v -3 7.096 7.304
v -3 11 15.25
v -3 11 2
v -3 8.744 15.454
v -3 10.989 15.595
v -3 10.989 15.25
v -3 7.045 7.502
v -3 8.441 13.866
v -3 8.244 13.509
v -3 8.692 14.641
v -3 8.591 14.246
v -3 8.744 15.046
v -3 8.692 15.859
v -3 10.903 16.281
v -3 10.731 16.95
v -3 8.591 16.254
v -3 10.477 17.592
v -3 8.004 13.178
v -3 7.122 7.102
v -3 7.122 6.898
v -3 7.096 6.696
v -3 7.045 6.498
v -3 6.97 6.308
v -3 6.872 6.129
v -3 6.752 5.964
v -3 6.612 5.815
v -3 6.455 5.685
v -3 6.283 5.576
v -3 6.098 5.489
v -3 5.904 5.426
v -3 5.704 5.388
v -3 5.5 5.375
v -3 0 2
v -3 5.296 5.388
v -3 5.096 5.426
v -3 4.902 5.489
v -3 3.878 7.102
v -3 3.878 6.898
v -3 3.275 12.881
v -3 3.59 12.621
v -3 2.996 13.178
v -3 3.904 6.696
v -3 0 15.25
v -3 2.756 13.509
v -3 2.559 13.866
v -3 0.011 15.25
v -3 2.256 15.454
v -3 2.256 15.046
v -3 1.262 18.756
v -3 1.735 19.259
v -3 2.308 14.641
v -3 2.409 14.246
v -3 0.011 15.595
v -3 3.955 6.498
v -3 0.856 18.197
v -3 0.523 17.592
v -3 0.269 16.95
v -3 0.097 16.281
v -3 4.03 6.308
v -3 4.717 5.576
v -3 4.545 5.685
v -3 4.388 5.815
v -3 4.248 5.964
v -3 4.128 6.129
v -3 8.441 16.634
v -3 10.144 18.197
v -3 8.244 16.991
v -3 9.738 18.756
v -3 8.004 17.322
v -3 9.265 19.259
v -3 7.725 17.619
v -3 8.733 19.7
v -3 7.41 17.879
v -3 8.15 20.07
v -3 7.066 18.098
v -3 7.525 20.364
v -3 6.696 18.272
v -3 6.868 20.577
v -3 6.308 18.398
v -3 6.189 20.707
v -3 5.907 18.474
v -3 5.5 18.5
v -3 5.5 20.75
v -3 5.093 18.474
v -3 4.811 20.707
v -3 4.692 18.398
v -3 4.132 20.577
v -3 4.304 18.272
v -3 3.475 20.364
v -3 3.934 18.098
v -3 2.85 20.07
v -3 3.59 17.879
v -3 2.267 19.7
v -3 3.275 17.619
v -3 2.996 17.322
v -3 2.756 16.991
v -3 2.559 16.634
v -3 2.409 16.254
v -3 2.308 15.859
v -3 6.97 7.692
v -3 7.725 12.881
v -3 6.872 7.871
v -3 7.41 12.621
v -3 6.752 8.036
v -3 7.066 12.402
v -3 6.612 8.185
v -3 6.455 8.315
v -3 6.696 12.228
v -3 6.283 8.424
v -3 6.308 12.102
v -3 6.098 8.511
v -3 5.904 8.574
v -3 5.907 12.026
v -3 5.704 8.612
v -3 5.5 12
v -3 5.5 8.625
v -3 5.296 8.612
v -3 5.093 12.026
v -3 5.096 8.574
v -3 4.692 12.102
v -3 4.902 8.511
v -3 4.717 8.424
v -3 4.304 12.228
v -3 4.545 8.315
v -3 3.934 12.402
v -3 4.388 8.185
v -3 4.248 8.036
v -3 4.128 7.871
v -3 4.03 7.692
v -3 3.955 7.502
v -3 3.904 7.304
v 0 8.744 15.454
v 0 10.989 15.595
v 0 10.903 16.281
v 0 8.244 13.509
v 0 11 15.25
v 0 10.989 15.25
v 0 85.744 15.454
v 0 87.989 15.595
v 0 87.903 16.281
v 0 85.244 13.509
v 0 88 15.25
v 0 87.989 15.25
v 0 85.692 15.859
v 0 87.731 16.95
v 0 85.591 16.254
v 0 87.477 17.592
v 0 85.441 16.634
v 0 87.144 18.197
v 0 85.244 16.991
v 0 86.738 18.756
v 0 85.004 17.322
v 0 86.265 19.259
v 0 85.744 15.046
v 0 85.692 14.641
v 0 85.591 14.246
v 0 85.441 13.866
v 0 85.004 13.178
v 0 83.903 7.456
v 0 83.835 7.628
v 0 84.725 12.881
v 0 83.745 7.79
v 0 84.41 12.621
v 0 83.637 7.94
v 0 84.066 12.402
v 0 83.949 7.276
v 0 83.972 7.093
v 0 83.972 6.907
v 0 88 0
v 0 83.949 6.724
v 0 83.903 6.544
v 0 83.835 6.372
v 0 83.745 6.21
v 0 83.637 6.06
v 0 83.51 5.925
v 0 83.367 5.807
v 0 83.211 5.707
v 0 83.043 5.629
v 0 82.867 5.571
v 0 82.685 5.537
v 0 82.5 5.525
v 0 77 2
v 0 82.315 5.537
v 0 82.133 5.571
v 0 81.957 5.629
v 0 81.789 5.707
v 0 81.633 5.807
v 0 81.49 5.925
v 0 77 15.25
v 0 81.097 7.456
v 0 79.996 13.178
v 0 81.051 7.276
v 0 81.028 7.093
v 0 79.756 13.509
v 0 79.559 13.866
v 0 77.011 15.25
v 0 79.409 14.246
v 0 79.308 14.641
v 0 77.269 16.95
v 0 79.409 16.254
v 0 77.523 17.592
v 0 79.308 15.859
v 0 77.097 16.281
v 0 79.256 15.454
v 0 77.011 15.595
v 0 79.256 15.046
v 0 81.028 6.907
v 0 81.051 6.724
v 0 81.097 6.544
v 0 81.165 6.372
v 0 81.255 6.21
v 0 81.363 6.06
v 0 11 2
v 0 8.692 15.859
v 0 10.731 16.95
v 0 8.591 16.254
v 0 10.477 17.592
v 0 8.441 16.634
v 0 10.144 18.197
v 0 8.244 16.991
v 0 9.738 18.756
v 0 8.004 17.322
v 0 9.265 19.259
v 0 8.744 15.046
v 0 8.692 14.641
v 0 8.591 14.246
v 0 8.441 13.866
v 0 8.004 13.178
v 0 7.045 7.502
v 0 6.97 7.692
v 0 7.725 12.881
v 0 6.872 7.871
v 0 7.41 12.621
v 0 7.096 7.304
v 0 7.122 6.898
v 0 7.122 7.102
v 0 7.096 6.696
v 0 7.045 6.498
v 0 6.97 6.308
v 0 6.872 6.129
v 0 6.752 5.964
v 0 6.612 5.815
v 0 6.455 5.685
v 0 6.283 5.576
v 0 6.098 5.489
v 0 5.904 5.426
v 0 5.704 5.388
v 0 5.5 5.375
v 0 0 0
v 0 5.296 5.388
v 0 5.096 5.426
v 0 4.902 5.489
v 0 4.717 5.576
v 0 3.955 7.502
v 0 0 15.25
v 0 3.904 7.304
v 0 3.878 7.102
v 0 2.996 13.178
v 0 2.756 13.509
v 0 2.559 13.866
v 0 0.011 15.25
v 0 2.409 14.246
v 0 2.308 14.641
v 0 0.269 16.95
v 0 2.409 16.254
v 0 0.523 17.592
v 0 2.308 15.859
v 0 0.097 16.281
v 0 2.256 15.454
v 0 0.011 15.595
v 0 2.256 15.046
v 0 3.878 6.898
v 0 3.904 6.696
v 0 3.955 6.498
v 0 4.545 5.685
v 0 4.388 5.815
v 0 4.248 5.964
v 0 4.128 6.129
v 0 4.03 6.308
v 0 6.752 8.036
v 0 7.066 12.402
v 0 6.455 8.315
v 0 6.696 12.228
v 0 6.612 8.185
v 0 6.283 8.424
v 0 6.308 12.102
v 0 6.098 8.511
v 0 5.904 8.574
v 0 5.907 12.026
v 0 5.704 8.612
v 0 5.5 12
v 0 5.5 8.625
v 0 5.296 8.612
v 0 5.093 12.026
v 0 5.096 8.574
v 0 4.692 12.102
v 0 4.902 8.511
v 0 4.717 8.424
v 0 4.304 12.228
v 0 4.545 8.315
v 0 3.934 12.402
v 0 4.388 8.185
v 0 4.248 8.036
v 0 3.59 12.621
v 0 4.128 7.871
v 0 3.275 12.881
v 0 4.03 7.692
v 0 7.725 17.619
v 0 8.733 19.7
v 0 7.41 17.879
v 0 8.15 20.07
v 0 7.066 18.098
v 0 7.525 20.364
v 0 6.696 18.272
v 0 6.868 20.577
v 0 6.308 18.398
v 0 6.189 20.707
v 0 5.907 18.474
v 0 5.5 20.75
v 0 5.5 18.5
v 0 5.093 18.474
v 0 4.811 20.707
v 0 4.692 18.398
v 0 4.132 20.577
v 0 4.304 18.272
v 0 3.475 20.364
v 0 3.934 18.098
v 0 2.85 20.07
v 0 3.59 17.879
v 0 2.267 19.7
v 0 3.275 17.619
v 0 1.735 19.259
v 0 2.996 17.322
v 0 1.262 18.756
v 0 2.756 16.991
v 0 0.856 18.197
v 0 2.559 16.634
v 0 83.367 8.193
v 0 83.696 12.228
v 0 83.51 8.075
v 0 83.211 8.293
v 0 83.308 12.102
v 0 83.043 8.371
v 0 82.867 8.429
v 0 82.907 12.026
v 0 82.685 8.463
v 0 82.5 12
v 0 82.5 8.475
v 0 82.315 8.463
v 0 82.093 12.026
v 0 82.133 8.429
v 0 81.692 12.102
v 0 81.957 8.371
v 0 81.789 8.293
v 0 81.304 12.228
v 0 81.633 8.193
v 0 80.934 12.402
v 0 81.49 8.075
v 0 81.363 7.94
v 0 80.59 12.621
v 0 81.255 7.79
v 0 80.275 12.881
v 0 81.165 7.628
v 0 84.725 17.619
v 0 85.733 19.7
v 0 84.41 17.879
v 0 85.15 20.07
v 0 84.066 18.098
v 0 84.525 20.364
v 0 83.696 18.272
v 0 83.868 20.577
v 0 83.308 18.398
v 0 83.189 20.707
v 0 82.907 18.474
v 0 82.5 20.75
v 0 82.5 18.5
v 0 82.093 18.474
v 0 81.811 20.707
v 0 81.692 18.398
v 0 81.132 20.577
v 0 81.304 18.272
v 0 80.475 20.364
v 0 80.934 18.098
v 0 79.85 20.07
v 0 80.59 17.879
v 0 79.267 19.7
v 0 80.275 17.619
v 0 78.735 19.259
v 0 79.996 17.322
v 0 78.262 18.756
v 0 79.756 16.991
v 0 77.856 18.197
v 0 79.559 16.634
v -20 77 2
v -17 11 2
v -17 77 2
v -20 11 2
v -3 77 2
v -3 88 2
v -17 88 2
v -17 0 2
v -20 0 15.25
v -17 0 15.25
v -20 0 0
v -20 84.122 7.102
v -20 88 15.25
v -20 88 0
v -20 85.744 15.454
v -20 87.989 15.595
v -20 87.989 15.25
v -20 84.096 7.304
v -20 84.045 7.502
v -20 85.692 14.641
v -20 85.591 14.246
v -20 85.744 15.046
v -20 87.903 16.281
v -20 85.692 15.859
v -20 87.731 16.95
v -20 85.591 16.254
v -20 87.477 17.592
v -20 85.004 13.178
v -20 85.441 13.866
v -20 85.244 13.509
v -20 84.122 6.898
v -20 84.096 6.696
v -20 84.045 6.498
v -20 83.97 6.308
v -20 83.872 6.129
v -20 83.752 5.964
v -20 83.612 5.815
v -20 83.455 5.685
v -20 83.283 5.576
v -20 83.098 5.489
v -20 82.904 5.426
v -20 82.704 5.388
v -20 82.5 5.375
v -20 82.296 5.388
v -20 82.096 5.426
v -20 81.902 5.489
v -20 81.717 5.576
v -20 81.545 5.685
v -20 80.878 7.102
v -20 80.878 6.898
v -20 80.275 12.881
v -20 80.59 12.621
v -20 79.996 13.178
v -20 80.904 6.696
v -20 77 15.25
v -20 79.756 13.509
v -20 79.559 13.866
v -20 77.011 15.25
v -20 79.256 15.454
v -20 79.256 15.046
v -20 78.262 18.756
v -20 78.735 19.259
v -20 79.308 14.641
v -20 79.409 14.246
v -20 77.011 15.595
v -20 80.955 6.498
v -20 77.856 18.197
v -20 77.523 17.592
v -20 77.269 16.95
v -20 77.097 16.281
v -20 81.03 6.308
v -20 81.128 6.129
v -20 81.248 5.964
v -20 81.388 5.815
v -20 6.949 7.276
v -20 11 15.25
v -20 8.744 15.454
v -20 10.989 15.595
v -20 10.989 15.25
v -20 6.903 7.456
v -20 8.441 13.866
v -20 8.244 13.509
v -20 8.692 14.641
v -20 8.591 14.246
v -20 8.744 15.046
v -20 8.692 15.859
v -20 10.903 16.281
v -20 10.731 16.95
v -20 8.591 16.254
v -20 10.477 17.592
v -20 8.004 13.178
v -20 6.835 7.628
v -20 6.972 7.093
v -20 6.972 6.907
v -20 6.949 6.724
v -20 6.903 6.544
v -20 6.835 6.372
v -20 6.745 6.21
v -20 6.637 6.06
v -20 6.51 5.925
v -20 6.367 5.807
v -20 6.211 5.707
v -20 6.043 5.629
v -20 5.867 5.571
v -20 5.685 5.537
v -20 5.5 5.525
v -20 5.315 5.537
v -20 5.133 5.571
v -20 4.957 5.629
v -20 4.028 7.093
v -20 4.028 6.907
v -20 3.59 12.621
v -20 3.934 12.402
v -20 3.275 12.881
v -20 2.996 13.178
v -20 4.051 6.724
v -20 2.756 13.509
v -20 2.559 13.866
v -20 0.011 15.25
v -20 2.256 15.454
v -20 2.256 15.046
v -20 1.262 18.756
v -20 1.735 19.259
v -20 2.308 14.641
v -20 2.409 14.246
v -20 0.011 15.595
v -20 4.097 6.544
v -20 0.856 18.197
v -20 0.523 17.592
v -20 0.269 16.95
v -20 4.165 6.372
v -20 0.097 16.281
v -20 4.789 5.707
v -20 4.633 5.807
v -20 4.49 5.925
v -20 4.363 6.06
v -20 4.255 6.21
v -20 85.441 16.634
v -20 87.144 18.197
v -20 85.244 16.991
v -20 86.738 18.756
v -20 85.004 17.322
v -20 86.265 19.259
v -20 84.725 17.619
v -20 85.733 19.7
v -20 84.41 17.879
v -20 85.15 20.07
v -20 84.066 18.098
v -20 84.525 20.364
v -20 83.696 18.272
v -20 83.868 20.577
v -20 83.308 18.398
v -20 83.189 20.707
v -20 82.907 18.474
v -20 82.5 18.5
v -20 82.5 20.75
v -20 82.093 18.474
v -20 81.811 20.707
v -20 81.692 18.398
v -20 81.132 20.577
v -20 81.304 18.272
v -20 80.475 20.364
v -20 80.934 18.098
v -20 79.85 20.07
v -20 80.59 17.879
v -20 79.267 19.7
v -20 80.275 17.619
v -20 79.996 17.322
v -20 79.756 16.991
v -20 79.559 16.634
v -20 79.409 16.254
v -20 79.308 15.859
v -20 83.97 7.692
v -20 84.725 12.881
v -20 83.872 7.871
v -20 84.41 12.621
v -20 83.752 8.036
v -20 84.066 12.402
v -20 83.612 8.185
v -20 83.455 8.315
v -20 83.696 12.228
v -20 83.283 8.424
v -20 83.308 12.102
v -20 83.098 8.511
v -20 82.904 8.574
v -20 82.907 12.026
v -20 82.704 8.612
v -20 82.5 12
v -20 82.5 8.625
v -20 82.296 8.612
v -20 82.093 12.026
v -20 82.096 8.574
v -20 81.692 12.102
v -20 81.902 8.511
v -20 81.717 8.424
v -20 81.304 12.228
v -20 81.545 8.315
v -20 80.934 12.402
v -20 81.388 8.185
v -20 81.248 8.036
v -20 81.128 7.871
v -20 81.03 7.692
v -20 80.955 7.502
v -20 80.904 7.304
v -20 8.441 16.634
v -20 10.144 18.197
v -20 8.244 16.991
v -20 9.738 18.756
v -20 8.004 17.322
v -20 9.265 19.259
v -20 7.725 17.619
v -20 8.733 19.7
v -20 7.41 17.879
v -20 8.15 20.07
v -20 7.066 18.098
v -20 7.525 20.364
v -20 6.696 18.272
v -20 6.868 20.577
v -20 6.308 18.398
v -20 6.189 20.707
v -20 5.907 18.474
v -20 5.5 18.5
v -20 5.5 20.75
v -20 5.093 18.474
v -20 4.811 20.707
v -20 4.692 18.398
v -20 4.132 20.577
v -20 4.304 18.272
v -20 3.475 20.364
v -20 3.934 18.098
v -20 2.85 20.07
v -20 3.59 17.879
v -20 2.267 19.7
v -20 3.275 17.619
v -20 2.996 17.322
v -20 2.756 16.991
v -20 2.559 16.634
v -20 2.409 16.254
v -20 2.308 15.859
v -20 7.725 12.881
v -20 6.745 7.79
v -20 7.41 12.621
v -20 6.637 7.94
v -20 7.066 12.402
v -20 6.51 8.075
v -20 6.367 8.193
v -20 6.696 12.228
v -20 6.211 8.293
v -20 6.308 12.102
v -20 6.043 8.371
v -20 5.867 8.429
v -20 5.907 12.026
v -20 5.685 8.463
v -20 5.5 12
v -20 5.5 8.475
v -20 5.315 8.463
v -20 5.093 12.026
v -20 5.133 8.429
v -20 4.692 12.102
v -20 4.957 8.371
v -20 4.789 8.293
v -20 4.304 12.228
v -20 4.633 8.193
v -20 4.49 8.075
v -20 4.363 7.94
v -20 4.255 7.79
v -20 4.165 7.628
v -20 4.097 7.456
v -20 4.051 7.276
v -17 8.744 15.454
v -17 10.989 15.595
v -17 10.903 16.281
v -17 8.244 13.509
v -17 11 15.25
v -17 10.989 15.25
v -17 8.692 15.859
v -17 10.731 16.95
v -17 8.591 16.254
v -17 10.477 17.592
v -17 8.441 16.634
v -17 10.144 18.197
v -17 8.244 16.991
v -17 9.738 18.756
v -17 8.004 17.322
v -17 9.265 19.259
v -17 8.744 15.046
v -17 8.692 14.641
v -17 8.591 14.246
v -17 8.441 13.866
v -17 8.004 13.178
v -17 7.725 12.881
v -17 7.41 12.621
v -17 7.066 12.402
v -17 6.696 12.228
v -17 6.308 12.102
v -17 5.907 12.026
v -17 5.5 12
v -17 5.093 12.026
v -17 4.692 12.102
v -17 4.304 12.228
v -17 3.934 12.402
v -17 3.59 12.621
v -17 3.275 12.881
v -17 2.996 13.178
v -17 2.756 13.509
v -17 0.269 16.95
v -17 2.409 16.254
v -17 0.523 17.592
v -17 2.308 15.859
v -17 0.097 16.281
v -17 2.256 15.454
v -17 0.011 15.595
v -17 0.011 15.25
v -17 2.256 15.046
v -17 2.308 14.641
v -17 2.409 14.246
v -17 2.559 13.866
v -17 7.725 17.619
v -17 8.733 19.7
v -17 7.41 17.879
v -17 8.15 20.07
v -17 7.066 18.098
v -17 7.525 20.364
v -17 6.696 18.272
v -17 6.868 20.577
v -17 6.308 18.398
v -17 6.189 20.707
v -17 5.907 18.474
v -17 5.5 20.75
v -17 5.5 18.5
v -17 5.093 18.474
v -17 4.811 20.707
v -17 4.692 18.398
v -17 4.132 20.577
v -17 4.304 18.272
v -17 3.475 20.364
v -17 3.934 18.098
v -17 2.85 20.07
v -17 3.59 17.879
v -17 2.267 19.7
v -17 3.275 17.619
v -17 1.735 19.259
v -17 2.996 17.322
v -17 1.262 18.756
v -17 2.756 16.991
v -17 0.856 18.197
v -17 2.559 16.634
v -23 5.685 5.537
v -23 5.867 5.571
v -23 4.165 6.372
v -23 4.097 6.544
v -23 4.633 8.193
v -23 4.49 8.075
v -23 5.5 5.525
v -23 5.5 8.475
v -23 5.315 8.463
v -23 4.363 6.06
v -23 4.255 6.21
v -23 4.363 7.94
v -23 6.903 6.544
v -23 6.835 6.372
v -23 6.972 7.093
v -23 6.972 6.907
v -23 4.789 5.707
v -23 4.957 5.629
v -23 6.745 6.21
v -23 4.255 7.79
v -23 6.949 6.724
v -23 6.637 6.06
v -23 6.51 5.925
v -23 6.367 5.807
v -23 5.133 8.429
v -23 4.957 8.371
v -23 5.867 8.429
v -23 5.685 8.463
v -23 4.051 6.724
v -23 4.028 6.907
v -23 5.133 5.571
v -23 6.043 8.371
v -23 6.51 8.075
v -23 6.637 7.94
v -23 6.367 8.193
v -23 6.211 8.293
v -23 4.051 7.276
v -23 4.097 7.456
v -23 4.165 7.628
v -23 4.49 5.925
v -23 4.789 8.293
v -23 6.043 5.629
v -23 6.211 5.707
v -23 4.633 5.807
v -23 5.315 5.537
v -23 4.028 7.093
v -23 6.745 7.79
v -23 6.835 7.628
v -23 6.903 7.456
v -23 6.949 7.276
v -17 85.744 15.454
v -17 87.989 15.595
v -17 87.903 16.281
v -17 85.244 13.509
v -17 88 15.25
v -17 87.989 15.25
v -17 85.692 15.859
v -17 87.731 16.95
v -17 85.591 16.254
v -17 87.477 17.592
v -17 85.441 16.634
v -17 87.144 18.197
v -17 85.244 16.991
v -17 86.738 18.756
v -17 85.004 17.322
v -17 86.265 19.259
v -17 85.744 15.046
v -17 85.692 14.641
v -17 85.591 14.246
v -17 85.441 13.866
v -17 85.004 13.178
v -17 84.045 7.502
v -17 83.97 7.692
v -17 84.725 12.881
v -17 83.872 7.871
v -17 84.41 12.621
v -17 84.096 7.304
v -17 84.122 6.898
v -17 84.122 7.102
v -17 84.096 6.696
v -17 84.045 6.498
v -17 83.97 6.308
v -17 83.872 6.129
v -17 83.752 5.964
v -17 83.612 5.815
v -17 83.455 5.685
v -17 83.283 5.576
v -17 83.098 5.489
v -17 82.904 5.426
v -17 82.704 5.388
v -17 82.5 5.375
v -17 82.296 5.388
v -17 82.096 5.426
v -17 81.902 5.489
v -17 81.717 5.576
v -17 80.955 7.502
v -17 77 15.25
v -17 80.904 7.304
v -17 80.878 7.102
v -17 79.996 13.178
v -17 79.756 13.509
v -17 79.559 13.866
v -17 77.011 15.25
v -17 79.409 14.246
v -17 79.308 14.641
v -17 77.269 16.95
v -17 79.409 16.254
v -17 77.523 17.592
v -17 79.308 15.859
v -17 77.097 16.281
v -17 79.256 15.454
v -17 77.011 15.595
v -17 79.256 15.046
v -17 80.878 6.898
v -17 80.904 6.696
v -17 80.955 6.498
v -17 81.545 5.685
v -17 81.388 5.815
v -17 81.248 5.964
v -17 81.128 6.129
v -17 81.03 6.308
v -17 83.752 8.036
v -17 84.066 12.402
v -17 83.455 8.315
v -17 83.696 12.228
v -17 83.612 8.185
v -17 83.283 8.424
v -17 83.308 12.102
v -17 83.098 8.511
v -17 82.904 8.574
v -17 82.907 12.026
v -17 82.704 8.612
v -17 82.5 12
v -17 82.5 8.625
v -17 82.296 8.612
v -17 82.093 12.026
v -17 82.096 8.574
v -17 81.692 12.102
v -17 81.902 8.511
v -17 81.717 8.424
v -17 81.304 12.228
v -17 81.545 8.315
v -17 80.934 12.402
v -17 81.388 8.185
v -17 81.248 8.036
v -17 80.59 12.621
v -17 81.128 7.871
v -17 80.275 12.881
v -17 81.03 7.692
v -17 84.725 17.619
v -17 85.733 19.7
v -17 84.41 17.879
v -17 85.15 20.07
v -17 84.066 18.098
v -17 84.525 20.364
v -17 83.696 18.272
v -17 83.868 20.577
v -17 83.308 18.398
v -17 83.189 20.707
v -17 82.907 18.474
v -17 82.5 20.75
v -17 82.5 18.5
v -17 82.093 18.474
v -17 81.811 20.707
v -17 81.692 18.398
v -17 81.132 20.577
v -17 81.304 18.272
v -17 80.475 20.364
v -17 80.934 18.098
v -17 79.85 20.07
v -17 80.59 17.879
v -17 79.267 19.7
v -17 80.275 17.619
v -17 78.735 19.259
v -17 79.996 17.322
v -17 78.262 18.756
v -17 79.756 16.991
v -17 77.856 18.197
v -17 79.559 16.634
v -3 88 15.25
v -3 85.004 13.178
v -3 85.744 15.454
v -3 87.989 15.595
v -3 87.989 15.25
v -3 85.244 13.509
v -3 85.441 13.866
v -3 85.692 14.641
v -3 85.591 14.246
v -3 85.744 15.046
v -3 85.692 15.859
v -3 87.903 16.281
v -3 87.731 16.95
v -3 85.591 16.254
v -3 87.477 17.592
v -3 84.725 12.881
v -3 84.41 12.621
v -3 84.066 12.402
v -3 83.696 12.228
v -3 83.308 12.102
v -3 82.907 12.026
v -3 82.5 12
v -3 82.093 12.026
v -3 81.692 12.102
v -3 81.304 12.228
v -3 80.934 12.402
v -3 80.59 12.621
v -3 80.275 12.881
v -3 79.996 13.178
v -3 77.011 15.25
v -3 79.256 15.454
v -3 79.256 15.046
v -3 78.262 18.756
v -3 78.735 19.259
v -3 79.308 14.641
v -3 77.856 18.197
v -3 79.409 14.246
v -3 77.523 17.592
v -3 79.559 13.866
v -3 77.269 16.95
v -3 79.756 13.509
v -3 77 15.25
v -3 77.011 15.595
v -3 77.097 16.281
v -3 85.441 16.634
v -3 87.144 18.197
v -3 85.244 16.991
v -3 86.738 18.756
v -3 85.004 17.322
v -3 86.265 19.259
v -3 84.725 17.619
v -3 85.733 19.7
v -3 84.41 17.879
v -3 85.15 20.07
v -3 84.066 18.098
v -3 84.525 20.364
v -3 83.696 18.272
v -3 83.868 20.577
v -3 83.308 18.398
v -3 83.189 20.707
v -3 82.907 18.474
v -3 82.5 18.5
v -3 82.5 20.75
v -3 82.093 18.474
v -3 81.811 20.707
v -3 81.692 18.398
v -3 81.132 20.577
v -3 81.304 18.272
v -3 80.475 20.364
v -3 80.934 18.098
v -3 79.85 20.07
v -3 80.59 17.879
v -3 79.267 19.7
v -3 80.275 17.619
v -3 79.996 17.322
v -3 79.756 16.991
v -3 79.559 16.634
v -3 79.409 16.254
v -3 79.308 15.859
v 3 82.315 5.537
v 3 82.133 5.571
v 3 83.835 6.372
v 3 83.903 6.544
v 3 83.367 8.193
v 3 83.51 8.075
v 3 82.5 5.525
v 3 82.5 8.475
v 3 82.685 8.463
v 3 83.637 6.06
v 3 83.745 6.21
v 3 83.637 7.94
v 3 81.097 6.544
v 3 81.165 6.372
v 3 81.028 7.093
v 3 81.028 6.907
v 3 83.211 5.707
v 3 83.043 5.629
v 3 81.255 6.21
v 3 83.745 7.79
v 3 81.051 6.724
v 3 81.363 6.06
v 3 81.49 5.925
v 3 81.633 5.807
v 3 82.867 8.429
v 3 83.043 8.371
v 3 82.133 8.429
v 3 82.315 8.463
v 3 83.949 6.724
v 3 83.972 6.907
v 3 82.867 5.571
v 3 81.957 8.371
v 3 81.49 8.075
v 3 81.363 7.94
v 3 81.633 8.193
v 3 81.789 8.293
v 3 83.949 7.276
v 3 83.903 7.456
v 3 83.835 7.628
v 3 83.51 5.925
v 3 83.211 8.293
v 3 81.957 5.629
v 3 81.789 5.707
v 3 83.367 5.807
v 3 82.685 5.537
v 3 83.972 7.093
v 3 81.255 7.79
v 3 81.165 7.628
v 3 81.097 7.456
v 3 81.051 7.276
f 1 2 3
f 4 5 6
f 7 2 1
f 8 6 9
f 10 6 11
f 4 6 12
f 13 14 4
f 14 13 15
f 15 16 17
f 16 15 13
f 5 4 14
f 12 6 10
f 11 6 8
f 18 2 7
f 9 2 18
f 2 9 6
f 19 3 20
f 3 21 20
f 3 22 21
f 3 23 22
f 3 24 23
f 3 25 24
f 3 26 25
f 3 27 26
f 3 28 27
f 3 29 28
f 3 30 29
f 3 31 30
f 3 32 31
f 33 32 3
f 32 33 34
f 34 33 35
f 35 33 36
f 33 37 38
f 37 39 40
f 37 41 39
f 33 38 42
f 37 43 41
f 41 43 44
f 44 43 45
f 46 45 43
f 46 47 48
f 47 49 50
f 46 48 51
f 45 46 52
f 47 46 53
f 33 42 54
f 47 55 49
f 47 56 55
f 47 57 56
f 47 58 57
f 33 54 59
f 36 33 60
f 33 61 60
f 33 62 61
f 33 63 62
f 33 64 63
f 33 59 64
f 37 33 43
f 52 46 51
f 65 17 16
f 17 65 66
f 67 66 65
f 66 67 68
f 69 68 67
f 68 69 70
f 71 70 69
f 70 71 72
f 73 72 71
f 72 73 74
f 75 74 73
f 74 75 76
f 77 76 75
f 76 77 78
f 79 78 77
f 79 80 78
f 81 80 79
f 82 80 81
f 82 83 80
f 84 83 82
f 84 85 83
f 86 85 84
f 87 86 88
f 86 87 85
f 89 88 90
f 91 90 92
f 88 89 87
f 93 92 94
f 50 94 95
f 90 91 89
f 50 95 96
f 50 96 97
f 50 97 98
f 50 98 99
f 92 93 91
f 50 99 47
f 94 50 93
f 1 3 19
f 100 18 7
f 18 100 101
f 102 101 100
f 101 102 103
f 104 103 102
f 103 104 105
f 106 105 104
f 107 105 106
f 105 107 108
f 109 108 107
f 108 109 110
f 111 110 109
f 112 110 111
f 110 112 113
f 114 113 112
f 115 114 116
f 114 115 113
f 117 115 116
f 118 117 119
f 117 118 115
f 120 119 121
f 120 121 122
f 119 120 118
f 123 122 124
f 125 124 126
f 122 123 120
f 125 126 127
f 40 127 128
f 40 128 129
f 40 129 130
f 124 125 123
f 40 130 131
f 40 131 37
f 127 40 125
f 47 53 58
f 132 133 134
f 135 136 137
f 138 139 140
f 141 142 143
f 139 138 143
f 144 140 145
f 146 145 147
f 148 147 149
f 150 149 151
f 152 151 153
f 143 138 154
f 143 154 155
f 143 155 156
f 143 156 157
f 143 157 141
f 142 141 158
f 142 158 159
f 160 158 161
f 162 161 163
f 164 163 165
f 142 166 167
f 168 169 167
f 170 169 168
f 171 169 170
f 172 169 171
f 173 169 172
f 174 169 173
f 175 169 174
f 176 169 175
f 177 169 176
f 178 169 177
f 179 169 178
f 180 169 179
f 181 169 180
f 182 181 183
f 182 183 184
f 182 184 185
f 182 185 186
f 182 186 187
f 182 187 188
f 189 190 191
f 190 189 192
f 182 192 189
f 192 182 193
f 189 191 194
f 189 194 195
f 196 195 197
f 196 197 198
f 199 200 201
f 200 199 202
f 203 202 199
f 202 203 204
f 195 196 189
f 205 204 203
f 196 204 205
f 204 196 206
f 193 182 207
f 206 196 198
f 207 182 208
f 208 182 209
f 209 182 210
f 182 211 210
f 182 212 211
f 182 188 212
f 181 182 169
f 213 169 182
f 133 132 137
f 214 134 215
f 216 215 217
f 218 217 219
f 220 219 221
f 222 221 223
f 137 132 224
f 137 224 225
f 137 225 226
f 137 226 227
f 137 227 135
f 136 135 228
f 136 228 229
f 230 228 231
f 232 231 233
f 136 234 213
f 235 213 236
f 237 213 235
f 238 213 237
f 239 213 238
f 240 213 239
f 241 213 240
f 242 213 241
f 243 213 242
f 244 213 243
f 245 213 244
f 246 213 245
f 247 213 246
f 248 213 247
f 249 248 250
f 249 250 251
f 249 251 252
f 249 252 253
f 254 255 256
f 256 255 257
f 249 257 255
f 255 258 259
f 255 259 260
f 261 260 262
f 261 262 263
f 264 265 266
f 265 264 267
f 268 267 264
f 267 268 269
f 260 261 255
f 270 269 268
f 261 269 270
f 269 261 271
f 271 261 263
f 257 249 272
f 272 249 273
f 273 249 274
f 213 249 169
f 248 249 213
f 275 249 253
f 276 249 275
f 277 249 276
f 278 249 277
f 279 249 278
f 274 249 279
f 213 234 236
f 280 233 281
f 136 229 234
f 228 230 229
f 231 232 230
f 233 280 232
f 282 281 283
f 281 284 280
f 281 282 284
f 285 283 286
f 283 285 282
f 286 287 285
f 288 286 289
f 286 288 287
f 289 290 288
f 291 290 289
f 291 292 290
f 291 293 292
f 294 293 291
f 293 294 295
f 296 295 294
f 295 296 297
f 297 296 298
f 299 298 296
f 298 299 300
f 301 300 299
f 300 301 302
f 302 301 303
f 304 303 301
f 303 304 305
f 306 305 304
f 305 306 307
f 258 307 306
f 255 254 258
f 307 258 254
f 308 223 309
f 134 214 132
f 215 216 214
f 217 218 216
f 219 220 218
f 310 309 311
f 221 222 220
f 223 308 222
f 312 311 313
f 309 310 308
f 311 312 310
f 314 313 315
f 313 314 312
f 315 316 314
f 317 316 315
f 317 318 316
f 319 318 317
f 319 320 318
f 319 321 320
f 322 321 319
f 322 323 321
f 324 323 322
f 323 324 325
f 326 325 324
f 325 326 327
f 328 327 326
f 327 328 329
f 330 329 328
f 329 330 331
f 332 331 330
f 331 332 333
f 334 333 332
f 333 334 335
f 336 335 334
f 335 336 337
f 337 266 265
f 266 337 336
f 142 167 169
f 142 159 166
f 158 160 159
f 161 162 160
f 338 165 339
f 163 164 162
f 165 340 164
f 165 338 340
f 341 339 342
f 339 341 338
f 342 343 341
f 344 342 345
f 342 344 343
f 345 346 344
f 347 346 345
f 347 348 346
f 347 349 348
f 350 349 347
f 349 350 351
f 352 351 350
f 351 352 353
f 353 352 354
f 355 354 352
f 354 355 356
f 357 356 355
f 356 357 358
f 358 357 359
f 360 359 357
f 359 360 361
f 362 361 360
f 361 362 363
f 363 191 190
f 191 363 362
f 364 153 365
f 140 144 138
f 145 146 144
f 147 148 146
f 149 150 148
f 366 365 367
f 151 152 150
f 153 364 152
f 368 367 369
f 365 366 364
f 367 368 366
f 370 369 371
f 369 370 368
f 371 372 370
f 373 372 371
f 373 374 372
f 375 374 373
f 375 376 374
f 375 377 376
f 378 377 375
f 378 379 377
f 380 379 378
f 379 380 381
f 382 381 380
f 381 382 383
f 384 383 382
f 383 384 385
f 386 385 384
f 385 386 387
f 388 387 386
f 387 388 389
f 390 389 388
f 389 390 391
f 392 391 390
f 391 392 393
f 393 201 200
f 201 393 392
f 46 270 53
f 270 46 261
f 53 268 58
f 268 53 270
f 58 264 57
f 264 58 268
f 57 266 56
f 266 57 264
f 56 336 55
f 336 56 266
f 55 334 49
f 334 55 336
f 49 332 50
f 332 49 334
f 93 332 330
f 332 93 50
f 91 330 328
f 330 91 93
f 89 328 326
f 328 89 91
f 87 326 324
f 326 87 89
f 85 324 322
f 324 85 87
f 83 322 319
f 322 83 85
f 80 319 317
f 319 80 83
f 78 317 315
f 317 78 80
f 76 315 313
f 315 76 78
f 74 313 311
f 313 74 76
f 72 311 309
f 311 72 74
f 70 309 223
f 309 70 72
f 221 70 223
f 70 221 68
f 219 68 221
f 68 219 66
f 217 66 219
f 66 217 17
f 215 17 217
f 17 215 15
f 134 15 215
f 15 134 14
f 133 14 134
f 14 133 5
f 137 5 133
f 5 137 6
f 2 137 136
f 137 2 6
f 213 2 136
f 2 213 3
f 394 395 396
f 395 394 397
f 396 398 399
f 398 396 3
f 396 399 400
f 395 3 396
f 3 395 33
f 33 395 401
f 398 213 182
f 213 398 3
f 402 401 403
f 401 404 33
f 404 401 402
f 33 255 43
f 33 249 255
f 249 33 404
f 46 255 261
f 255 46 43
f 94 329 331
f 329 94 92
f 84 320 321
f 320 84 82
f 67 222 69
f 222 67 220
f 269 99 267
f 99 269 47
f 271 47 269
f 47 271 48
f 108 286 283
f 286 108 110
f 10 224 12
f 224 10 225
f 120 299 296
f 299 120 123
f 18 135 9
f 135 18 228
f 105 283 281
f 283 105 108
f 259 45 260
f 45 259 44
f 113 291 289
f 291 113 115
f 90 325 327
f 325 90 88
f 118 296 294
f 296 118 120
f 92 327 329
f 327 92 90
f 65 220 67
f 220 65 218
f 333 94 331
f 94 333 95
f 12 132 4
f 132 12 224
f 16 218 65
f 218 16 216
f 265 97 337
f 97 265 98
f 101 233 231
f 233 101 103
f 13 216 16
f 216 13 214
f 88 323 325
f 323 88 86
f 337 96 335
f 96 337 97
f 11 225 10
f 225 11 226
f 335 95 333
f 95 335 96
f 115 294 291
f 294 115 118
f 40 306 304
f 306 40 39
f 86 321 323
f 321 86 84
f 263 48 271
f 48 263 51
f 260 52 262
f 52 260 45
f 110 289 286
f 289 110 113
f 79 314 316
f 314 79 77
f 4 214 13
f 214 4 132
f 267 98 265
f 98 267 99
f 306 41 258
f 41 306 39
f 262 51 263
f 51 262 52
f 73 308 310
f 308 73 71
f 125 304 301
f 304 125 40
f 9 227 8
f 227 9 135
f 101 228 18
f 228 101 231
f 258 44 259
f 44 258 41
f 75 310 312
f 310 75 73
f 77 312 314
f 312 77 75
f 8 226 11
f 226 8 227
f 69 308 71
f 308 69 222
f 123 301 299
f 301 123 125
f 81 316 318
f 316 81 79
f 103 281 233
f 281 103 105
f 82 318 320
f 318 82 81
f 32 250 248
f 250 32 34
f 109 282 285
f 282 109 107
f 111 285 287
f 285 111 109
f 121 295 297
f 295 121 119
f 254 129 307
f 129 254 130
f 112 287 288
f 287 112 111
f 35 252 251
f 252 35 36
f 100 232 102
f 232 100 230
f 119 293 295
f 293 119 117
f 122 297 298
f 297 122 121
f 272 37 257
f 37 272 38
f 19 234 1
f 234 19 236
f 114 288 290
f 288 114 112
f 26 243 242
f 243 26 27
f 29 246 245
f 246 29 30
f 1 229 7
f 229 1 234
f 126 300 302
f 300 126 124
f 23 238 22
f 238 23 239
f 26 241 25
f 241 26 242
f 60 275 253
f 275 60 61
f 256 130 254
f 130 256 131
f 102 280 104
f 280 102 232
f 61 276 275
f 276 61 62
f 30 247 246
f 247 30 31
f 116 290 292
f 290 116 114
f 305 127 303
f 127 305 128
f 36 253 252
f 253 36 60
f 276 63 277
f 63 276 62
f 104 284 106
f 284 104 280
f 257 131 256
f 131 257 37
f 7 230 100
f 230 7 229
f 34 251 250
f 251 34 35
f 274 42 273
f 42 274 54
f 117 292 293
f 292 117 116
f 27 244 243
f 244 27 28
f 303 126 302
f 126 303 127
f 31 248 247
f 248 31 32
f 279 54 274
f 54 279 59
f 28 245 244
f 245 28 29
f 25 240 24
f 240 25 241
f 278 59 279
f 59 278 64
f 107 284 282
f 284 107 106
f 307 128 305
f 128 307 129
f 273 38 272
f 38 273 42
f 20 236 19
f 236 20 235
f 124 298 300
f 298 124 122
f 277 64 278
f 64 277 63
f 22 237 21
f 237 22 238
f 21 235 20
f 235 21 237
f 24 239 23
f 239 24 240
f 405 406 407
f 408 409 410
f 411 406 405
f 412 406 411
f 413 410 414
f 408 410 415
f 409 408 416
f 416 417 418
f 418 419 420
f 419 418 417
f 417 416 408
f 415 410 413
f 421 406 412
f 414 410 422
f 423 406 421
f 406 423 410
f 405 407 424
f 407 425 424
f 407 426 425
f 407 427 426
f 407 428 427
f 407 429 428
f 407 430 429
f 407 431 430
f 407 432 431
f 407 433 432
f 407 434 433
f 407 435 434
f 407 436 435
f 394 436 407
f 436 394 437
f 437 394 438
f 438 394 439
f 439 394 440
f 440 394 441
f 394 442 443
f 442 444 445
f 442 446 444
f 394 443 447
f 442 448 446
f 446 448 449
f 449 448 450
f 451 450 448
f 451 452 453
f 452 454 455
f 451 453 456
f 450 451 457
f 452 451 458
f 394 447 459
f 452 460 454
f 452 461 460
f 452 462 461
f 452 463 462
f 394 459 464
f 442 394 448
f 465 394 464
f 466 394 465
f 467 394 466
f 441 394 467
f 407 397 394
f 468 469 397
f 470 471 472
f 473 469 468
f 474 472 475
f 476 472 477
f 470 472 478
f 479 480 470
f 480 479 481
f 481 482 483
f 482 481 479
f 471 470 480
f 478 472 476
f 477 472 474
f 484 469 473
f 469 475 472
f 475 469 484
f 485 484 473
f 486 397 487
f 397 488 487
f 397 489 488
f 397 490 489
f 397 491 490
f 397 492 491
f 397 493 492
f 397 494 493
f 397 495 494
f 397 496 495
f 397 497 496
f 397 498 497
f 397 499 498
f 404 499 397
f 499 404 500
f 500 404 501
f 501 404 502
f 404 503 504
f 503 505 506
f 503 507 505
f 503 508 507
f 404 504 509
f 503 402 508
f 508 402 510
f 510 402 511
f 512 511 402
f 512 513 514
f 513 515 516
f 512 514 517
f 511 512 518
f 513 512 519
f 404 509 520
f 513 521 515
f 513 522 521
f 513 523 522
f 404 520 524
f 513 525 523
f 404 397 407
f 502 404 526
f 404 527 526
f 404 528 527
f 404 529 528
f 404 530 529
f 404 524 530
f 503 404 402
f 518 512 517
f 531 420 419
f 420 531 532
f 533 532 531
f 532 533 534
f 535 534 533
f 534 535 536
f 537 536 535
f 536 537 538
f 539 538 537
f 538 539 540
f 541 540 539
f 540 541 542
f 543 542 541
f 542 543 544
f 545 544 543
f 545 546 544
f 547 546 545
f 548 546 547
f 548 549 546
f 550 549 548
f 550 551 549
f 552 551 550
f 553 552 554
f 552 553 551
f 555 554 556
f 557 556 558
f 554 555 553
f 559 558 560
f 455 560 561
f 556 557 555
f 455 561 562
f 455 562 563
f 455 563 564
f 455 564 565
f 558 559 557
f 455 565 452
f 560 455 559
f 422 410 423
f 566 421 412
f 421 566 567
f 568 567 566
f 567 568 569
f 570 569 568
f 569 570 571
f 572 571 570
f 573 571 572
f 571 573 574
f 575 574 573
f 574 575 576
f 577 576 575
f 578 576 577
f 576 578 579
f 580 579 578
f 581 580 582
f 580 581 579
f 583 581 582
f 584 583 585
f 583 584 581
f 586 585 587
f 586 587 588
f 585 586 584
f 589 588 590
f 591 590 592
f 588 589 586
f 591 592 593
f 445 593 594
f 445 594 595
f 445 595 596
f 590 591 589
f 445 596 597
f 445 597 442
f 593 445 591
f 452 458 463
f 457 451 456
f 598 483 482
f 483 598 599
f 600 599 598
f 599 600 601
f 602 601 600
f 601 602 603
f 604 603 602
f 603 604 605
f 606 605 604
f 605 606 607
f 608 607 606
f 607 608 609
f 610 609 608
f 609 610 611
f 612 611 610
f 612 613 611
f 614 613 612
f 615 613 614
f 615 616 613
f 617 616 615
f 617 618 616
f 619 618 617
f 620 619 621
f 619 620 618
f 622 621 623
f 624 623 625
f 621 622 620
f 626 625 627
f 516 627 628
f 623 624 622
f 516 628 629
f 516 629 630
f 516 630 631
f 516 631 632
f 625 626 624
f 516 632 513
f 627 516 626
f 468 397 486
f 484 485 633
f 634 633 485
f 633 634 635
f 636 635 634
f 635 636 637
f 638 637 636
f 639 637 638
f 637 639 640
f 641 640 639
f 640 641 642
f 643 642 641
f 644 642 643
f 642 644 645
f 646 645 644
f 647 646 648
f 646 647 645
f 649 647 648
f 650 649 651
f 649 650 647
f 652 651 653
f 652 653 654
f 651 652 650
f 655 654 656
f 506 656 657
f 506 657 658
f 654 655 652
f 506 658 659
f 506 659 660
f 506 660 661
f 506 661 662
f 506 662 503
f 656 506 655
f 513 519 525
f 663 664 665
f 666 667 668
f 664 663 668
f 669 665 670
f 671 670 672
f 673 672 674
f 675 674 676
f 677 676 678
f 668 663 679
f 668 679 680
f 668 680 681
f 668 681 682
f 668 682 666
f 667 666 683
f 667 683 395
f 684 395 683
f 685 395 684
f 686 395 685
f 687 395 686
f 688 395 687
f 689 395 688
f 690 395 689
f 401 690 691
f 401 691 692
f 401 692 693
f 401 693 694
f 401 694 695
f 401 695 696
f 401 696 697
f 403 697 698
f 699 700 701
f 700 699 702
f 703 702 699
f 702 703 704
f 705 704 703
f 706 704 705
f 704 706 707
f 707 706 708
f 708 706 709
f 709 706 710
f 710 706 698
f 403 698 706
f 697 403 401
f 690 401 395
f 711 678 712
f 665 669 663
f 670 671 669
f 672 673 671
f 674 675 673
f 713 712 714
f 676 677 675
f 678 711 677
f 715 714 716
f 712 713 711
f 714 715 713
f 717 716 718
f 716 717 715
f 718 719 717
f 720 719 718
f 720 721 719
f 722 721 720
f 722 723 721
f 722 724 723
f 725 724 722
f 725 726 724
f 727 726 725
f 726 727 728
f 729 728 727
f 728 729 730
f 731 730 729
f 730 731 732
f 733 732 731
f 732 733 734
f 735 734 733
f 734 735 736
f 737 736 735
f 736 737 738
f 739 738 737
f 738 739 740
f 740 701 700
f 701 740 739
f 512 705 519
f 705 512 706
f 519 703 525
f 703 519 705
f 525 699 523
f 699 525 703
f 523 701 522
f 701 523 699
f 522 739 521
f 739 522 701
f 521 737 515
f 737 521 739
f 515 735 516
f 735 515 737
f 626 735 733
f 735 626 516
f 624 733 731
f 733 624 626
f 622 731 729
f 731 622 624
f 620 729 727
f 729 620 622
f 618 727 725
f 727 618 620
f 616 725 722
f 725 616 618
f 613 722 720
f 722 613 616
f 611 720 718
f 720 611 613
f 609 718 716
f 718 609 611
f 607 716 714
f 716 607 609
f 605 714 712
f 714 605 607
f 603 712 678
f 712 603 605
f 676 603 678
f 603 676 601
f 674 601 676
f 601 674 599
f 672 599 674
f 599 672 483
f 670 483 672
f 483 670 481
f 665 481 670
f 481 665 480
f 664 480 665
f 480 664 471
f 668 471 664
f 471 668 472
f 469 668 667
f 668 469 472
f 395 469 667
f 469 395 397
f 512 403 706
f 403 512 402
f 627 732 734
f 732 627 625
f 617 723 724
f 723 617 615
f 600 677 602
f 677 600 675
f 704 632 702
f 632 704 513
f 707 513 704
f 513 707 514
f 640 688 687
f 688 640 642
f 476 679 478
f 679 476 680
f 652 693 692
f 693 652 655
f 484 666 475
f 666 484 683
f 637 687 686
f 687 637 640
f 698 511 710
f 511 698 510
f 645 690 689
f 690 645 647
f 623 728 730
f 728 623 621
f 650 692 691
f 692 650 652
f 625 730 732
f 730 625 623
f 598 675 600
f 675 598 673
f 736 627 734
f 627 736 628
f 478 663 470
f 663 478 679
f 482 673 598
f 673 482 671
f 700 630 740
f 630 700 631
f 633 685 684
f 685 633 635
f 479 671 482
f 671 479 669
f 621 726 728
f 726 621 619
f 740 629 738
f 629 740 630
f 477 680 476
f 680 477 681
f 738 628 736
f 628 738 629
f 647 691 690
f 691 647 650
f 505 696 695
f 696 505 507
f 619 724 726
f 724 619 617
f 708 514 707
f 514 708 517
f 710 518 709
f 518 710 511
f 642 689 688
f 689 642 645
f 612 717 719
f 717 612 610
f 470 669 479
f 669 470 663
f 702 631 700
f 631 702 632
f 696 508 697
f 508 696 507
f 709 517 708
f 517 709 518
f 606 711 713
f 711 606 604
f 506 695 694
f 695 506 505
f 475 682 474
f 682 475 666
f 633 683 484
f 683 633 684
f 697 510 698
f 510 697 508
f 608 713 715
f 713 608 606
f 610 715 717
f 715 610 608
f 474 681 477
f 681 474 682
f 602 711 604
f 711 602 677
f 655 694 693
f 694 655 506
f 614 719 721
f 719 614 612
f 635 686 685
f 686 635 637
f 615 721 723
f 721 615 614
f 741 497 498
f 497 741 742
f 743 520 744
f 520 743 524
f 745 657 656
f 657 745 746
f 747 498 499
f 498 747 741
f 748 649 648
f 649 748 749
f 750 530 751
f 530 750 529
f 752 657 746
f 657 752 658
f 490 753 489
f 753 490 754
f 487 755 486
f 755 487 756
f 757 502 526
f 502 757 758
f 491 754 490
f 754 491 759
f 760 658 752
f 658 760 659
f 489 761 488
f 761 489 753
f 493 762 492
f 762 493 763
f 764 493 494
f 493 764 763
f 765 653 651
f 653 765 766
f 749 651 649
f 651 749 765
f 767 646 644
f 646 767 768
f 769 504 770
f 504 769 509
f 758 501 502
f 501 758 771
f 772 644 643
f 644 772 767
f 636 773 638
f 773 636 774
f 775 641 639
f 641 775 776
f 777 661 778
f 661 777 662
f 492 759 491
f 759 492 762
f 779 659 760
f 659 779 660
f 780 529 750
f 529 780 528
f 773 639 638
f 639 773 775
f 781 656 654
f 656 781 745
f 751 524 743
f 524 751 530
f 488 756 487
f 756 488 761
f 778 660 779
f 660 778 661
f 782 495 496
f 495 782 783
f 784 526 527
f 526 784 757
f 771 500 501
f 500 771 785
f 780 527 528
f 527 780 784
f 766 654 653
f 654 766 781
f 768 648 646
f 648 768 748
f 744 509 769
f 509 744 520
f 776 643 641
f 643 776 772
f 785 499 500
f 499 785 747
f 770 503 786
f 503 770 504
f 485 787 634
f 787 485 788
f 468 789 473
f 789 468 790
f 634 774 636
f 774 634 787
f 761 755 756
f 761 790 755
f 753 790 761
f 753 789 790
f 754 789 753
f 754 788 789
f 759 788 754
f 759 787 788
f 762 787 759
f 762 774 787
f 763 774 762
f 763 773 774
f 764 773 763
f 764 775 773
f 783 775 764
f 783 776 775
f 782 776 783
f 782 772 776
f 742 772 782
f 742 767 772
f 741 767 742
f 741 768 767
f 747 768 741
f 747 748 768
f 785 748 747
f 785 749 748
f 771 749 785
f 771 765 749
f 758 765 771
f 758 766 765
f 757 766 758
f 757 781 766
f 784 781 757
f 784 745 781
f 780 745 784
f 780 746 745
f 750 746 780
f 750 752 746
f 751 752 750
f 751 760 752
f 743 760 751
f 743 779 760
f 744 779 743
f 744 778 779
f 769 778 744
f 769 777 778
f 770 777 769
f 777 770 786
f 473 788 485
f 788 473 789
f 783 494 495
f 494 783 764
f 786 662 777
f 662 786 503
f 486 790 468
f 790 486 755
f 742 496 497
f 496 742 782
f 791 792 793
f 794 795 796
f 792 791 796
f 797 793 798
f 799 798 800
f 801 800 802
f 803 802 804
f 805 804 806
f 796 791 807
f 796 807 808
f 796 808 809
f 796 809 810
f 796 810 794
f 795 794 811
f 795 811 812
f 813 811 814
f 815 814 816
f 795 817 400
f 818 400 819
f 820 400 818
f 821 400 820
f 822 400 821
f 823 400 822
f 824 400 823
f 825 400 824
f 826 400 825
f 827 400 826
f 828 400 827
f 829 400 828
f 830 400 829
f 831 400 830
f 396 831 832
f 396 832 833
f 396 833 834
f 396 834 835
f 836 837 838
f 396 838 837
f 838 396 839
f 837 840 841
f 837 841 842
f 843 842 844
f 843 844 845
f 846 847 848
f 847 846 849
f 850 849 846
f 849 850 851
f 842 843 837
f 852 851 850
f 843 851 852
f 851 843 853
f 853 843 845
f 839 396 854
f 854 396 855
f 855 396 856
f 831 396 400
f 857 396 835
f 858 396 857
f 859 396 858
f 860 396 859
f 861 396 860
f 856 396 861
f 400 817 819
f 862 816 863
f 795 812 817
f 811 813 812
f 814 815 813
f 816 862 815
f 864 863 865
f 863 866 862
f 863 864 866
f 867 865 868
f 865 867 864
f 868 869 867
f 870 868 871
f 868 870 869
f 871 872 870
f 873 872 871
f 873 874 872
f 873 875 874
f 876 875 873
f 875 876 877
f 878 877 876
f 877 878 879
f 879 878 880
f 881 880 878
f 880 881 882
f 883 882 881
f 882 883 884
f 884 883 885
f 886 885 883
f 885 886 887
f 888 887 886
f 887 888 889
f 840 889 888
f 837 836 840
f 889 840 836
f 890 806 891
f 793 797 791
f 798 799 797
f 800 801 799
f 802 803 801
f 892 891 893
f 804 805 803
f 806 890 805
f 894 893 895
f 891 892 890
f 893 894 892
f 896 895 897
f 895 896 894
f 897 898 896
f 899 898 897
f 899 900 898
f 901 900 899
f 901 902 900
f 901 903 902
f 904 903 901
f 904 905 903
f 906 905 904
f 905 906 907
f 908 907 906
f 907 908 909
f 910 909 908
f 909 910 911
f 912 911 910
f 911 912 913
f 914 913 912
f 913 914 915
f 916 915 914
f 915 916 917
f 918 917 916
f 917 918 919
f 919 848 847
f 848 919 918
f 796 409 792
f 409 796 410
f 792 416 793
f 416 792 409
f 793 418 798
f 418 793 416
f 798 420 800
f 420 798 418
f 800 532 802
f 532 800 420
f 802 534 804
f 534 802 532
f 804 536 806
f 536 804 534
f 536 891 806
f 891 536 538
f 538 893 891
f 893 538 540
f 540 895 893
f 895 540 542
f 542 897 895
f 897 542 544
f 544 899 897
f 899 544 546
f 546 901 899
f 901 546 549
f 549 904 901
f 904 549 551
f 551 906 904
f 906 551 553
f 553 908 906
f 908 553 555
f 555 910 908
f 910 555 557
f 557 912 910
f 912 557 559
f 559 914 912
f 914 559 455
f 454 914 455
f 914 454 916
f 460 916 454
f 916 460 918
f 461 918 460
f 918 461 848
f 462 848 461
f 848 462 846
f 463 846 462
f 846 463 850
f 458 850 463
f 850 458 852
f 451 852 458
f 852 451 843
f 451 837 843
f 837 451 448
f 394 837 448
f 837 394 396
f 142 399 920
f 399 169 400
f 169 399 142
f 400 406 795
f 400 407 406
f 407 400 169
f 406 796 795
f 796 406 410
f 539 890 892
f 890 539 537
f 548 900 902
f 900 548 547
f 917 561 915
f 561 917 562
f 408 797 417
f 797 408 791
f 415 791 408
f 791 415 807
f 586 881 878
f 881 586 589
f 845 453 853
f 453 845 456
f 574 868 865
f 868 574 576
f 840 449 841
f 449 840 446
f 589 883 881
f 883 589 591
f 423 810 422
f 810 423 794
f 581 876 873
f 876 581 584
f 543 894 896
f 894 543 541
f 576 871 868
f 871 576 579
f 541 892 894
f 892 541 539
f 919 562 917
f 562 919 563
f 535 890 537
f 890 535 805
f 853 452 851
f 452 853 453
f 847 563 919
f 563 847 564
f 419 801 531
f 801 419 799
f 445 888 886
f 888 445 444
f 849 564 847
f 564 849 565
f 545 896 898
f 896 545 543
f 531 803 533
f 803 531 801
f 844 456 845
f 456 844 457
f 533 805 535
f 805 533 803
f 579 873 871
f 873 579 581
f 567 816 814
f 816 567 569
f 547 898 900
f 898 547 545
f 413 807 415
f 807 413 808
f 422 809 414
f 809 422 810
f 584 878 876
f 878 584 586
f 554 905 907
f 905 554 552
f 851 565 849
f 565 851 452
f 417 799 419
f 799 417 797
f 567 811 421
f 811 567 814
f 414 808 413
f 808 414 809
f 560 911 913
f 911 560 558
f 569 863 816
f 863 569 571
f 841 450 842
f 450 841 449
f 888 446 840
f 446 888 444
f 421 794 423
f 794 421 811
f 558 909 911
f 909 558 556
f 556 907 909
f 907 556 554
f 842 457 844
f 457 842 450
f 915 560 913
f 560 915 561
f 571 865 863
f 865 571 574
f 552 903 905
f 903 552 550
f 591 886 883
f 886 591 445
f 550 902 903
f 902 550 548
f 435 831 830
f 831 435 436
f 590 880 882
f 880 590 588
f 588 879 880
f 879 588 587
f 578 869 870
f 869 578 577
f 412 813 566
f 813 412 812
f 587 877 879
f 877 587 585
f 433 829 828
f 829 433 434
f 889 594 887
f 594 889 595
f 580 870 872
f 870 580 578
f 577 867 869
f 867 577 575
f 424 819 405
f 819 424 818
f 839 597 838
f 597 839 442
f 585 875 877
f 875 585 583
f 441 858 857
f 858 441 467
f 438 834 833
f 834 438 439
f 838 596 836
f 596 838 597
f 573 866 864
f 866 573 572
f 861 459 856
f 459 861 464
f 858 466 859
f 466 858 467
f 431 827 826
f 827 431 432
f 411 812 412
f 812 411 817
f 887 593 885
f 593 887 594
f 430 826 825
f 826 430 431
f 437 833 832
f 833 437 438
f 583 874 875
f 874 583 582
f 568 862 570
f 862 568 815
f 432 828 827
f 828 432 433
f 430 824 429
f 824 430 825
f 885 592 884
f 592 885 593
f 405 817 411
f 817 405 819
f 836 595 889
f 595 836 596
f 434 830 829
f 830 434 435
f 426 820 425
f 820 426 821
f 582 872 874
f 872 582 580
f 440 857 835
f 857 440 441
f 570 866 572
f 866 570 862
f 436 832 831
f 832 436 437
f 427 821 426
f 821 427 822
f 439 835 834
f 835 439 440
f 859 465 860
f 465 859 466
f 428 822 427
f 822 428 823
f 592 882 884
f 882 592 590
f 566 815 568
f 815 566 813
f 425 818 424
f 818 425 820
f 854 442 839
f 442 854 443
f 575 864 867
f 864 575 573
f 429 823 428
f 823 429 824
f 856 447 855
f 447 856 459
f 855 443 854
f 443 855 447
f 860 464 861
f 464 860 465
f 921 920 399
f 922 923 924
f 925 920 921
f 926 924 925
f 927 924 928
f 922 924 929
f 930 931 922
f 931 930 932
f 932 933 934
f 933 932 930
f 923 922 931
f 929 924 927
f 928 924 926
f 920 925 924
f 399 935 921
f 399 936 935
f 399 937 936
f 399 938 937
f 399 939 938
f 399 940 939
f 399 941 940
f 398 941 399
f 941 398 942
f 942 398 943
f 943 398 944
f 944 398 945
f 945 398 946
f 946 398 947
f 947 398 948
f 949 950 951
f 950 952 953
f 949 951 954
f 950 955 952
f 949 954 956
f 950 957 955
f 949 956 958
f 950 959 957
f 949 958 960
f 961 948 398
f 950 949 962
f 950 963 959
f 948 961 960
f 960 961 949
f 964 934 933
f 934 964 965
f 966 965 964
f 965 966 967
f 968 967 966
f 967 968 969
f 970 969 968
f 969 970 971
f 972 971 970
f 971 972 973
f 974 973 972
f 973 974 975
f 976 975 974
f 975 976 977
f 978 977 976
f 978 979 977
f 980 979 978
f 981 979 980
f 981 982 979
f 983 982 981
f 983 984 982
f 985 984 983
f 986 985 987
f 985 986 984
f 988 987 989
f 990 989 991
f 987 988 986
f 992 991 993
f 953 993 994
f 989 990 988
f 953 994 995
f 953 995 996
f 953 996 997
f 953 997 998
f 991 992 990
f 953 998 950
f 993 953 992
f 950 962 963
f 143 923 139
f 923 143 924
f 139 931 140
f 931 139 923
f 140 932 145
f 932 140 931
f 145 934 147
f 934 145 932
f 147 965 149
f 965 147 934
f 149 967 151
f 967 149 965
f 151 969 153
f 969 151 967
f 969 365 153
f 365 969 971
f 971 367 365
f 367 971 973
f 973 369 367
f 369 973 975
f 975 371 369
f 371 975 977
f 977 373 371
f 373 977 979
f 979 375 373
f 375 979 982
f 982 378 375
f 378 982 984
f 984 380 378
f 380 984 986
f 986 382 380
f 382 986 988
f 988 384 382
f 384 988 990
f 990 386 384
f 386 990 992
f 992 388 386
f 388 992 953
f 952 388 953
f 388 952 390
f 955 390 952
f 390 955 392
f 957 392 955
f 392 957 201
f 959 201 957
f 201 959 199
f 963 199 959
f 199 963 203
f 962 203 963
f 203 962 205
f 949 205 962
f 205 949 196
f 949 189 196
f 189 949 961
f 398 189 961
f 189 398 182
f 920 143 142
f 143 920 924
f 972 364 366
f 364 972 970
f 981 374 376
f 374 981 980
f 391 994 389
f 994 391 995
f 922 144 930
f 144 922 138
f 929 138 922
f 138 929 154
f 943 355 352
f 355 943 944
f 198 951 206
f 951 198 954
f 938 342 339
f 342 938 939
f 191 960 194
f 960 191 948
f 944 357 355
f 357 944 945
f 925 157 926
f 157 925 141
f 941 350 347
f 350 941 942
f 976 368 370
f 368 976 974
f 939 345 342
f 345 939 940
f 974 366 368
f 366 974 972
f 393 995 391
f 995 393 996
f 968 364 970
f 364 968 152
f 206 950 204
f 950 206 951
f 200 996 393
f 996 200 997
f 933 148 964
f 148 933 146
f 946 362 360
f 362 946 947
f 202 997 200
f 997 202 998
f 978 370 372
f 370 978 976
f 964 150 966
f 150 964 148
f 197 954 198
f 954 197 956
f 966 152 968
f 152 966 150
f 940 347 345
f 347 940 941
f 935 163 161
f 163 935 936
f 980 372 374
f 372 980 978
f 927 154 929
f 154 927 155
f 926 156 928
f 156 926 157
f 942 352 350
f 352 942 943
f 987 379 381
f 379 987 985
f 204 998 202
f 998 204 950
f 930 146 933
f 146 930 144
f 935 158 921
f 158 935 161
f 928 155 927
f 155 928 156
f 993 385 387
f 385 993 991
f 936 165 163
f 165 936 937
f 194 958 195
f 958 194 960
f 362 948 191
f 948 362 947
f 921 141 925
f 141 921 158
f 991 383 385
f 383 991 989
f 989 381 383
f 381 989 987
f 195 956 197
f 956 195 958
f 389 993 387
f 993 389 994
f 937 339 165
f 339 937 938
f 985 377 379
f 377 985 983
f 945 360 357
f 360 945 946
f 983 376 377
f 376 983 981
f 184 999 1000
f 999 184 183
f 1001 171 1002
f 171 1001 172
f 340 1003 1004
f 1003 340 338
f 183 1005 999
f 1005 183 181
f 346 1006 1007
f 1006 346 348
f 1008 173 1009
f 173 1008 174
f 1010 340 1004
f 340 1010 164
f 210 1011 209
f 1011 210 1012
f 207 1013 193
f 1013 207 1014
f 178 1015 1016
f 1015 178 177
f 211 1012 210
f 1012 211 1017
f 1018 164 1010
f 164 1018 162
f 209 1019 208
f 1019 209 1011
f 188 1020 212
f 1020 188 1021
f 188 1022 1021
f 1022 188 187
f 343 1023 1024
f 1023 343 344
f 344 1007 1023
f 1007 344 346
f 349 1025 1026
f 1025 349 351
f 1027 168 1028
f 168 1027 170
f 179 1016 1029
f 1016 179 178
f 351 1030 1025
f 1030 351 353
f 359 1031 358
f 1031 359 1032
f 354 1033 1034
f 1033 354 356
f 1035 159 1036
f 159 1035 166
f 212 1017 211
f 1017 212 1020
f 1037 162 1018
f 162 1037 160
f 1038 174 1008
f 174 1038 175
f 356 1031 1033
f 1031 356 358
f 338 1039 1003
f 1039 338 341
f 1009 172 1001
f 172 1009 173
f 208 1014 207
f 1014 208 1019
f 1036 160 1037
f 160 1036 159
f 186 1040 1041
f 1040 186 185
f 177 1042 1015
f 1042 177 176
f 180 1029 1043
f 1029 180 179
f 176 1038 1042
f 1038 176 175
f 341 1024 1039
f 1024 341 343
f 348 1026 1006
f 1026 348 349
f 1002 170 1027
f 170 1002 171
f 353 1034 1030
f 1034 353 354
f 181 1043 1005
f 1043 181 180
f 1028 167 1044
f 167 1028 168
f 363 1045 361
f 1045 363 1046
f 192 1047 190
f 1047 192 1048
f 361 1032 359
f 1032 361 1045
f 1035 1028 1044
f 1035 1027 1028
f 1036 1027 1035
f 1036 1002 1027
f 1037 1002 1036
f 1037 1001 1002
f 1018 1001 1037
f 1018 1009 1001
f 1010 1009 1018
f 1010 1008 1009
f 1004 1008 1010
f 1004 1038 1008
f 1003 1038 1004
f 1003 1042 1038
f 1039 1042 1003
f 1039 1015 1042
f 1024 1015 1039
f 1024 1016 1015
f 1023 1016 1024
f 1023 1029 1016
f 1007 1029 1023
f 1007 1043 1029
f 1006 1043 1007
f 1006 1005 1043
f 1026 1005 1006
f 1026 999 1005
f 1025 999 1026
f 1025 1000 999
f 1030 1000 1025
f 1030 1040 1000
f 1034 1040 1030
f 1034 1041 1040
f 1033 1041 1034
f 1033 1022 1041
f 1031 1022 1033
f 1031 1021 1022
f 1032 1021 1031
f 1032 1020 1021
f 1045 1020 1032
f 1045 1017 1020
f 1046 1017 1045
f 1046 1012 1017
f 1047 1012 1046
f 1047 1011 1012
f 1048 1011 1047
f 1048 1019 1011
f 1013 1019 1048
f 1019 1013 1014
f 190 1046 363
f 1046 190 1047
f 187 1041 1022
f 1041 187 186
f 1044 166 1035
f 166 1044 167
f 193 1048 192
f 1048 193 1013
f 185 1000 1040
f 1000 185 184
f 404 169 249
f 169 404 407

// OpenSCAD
eps = 1;

$fn=50;
_1u = 44;
face = [20, 2*_1u, 2];

rodHoleR = 3.25;
rodHolePosX = 10;
rodSupportDim = [11, rodHolePosX + rodHoleR, 3];
attachPinR = rodHoleR/2;

mirror([1,0,0]) {
    linear_extrude(face.z) square([face.x,face.y]);

    rodSupportSet();

    translate([face.x,face.y,0]) rotate([0,0,180]) rodSupportSet();
}

module rodSupportSet() {
    translate([0,0,face.z]) {
        difference () {
            rodSupport();
            translate([-eps/2,rodSupportDim.x/2,rodHolePosX/2]) rotate([0,90,0]) 
                linear_extrude(rodSupportDim.z+eps) circle(attachPinR);
        }    
        
        translate([face.x-rodSupportDim.z,0,0]) {
            rodSupport();
            translate([rodSupportDim.z,rodSupportDim.x/2,rodHolePosX/2]) rotate([0,90,0]) 
                linear_extrude(rodSupportDim.z) circle(attachPinR-.15);
        }
    }
}

module rodSupport() {
    translate([rodSupportDim.z,0,0])
    rotate([0,-90,0])
    difference() {
        linear_extrude(rodSupportDim.z) {
            square([rodSupportDim.y,rodSupportDim.x]);
            translate([rodHolePosX + rodHoleR, rodSupportDim.x/2, 0]) circle(rodSupportDim.x/2);
        }
        translate([rodHolePosX + rodHoleR, rodSupportDim.x/2, -eps/2]) 
            linear_extrude(rodSupportDim.z+eps) 
                circle(rodHoleR);
    }
}
